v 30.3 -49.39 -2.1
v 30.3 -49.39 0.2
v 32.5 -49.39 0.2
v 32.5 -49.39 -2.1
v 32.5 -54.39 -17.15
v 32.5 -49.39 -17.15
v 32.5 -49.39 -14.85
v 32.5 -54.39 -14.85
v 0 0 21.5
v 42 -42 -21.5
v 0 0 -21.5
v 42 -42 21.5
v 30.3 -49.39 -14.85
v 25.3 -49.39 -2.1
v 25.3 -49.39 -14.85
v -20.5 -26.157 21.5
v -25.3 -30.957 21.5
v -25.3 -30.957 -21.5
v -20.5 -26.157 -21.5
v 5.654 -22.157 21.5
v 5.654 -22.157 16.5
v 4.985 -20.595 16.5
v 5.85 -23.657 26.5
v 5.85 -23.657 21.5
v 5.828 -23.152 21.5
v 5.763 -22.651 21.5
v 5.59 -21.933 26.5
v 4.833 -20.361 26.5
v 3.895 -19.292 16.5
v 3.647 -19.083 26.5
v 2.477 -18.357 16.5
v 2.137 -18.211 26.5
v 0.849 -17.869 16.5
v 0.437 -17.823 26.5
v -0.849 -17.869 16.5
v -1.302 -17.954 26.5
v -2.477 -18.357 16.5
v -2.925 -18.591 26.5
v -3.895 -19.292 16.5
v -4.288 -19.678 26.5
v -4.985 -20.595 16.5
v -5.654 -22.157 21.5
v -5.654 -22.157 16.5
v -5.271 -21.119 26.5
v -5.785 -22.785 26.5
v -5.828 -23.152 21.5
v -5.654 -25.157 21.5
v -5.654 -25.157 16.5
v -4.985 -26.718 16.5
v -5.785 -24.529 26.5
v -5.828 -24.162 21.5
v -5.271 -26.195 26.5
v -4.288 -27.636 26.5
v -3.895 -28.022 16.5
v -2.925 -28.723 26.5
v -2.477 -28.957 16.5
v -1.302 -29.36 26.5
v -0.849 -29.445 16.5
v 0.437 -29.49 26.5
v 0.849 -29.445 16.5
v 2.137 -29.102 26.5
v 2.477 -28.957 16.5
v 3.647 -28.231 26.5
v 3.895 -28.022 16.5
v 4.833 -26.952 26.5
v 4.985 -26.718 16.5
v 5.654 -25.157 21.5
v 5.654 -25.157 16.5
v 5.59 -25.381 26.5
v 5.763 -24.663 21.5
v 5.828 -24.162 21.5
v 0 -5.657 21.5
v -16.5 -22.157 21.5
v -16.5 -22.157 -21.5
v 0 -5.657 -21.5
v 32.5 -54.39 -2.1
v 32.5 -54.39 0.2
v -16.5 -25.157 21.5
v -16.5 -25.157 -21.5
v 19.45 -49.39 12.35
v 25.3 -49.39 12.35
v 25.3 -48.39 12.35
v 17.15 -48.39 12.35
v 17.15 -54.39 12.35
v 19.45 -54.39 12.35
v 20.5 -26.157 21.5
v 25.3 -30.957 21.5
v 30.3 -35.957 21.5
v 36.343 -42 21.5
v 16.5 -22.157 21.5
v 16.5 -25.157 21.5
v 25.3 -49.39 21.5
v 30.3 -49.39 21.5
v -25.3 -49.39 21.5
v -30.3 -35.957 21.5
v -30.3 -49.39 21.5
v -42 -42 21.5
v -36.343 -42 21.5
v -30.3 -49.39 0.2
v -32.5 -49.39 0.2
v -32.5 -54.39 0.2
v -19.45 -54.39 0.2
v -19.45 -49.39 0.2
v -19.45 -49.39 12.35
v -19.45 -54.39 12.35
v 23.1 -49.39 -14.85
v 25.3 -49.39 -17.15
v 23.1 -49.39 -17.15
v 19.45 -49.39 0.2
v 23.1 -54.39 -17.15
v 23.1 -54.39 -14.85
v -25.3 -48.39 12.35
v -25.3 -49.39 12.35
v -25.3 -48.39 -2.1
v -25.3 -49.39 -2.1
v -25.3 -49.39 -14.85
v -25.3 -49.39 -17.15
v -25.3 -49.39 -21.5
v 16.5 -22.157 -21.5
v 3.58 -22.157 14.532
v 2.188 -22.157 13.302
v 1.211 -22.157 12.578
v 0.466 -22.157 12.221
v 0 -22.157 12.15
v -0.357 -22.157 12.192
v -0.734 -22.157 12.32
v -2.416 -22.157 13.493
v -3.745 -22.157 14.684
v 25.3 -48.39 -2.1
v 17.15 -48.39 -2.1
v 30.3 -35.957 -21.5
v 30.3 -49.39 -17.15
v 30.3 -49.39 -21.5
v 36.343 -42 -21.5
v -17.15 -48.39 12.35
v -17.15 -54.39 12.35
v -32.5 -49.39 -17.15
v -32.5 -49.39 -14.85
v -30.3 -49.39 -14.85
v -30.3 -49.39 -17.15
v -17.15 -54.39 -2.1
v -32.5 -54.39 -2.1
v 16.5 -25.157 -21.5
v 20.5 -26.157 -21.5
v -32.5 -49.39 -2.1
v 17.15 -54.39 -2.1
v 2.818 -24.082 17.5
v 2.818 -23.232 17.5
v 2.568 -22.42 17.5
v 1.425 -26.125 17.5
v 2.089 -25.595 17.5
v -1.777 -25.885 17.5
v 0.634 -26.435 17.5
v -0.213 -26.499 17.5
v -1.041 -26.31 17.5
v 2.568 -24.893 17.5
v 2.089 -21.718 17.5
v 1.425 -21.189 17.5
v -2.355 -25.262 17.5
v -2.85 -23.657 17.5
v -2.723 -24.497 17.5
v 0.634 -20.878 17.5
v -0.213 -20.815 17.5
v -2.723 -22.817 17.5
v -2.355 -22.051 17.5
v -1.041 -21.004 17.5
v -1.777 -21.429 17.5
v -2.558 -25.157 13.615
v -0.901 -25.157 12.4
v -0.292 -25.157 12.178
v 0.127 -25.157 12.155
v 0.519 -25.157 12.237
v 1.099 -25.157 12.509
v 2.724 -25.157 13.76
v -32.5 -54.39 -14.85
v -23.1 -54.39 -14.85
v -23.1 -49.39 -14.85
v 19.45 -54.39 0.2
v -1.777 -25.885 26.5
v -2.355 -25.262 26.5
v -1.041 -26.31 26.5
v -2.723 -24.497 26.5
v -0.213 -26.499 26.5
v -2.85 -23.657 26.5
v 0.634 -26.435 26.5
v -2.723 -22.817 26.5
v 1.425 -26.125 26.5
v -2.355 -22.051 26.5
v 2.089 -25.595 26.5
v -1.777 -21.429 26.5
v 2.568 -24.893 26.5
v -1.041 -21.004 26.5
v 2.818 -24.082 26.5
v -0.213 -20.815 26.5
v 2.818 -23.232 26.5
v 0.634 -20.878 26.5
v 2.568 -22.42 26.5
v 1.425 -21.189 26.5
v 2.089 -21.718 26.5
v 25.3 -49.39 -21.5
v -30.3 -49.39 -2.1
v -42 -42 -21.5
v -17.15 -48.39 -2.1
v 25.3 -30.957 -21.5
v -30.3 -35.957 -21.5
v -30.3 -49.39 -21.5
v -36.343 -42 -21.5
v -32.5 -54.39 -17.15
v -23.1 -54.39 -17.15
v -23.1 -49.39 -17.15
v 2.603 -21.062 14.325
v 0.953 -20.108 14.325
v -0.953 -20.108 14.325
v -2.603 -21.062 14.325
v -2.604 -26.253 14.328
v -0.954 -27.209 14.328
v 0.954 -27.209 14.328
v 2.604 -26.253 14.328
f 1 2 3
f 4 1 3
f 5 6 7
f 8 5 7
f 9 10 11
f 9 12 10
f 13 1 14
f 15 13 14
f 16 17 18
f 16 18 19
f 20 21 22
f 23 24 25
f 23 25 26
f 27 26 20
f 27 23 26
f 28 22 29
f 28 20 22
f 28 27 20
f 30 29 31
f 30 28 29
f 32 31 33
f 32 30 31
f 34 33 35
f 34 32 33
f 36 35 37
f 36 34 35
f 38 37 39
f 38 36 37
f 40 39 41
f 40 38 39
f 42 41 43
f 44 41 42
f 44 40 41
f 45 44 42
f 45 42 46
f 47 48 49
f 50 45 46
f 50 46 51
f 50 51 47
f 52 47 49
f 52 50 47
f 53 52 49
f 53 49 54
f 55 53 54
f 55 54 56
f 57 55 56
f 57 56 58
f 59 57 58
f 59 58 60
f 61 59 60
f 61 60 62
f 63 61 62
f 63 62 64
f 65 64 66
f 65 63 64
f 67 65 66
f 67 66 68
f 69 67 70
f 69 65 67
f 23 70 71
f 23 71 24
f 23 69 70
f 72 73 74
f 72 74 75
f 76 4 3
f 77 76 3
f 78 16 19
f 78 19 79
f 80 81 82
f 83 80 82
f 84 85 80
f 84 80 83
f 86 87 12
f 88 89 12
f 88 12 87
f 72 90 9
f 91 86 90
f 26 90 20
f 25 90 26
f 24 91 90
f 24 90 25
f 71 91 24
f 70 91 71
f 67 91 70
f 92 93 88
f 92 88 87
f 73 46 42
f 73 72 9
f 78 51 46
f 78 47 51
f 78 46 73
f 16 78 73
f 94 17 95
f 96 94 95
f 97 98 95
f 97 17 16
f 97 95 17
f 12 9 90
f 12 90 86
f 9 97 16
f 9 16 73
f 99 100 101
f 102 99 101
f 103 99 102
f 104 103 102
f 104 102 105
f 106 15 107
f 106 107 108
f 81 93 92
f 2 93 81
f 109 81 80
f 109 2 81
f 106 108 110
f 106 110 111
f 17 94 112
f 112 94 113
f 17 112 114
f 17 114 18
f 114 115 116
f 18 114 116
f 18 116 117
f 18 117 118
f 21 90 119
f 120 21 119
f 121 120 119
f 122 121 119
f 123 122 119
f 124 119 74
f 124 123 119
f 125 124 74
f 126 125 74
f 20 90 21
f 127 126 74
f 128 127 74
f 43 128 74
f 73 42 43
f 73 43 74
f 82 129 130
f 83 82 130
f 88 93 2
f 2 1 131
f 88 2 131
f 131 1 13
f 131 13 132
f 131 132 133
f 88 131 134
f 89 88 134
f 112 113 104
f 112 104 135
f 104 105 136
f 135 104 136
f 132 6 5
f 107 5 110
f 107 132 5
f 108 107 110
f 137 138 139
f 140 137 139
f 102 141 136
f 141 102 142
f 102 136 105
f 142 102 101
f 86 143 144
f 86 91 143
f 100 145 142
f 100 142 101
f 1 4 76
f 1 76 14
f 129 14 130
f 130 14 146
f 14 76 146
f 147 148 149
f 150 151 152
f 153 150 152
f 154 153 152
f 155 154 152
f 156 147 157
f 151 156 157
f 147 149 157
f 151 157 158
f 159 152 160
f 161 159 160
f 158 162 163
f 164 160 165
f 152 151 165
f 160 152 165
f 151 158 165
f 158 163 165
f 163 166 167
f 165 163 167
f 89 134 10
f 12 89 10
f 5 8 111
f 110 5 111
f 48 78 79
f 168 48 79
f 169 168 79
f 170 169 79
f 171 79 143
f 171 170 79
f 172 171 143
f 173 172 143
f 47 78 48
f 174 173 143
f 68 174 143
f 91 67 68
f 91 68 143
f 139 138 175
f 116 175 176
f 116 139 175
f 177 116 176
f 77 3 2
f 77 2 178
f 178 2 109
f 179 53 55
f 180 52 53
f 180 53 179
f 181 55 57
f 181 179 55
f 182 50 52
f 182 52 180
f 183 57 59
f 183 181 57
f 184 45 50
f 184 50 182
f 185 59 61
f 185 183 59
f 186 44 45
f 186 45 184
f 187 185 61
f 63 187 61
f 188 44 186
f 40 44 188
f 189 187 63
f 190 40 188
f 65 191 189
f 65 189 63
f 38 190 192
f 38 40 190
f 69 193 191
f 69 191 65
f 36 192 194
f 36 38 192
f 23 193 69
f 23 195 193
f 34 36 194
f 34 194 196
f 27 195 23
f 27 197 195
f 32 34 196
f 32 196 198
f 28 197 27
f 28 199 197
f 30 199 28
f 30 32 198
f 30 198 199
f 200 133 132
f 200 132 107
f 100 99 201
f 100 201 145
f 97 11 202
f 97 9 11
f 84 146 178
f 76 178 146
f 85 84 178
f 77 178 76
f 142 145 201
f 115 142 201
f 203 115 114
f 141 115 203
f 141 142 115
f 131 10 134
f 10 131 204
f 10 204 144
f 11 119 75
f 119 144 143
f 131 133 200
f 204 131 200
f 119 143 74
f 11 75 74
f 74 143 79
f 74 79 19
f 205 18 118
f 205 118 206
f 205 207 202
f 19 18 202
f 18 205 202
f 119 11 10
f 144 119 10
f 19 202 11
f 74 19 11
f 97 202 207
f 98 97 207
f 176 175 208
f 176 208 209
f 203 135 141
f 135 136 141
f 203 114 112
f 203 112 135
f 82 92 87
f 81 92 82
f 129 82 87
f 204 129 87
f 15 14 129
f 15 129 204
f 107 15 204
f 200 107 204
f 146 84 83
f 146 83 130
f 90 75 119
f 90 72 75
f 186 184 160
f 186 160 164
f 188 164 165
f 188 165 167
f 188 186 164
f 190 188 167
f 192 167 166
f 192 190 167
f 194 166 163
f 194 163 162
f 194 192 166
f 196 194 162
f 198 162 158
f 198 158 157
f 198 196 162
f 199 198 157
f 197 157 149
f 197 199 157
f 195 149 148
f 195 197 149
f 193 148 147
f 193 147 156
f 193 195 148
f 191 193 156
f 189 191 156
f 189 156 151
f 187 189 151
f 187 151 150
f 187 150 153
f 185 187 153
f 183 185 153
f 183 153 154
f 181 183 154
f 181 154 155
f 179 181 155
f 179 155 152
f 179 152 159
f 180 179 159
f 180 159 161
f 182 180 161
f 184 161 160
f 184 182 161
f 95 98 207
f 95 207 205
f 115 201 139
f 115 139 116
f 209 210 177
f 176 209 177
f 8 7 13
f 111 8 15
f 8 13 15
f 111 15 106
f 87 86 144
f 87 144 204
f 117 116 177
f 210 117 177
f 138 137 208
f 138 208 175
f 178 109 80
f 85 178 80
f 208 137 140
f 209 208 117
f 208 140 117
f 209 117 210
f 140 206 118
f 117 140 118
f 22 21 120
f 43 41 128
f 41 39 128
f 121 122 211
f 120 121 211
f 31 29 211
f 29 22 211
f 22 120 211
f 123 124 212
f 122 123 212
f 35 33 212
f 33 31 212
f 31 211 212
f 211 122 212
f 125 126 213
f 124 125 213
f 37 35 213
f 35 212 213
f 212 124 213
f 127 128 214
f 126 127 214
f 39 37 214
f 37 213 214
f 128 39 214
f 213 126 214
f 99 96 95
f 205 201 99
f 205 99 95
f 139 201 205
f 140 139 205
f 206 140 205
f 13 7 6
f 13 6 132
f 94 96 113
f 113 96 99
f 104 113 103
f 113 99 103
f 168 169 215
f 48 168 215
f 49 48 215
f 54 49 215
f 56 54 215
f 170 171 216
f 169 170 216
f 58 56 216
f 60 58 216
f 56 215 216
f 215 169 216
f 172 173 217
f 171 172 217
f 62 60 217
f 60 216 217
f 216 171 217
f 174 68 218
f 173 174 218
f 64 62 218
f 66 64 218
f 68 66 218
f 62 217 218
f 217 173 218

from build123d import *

# Parameters (mm, degrees)
BOSS_EXTRUDE1_DEPTH  = 21.5
BOSS_EXTRUDE7_START  = 5
SKETCH11_R           = 5.85
BOSS_EXTRUDE7_DEPTH  = 10
SKETCH12_R           = 2.85
CUT_EXTRUDE3_DEPTH   = 9
BOSS_EXTRUDE8_START  = 0.1
SKETCH14_W           = 5
SKETCH14_H           = 43
BOSS_EXTRUDE8_DEPTH  = 18.432718
SKETCH17_W           = 9.4
SKETCH17_H           = 2.3
BOSS_EXTRUDE10_DEPTH = 5
SKETCH18_W           = 8.15
SKETCH18_H           = 14.45
BOSS_EXTRUDE11_DEPTH = 1


with BuildPart() as part:
    # Sketch1 → Boss-Extrude1 (new body, symmetric)
    with BuildSketch(Plane.XY):
        Polygon((0, 0), (-42, -42), (-36.343145751, -42), (-32.343145751, -38), (-20.5, -26.156854249), (-16.5, -25.156854249), (16.5, -25.156854249), (20.5, -26.156854249), (32.343145751, -38), (36.343145751, -42), (42, -42), align=None)
        Polygon((-16.5, -22.156854249), (0, -5.656854249), (16.5, -22.156854249), align=None, mode=Mode.SUBTRACT)
    extrude(amount=BOSS_EXTRUDE1_DEPTH, both=True)

    # Sketch11 → Boss-Extrude7 (add)
    with BuildSketch(Plane.XY.offset(21.5).offset(BOSS_EXTRUDE7_START)):
        with Locations((0, -23.656854249)):
            Circle(SKETCH11_R)
    extrude(amount=-BOSS_EXTRUDE7_DEPTH)

    # Sketch12 → Cut-Extrude3 (cut)
    with BuildSketch(Plane(origin=(0, 0, 26.5), x_dir=(-1, 0, 0), z_dir=(0, 0, -1))):
        with Locations((0, -23.656854249)):
            Circle(SKETCH12_R)
    extrude(amount=CUT_EXTRUDE3_DEPTH, mode=Mode.SUBTRACT)

    # Sketch14 → Boss-Extrude8 (add)
    with BuildSketch(Plane(origin=(0, -49.48957189, 0), x_dir=(1, 0, 0), z_dir=(0, 1, 0)).offset(BOSS_EXTRUDE8_START)):
        with Locations((-27.8, 0)):
            Rectangle(SKETCH14_W, SKETCH14_H)
    boss_extrude8 = extrude(amount=BOSS_EXTRUDE8_DEPTH)

    # Sketch17 → Boss-Extrude10 (add)
    with BuildSketch(Plane.XZ.offset(49.38957189)):
        Polygon((-17.15, 12.35), (-17.15, -2.1), (-32.5, -2.1), (-32.5, 0.2), (-19.45, 0.2), (-19.45, 12.35), align=None)
        with Locations((-27.8, -16)):
            Rectangle(SKETCH17_W, SKETCH17_H)
    boss_extrude10 = extrude(amount=BOSS_EXTRUDE10_DEPTH)

    # Sketch18 → Boss-Extrude11 (add)
    with BuildSketch(Plane(origin=(0, -49.38957189, 0), x_dir=(1, 0, 0), z_dir=(0, 1, 0))):
        with Locations((-21.225, -5.125)):
            Rectangle(SKETCH18_W, SKETCH18_H)
    boss_extrude11 = extrude(amount=BOSS_EXTRUDE11_DEPTH)

    # Mirror2: Boss-Extrude8, Boss-Extrude10, Boss-Extrude11 across plane
    add(boss_extrude8.mirror(Plane(origin=(0, 0, 0), x_dir=(0, 0, 1), z_dir=(1, 0, 0))))
    add(boss_extrude10.mirror(Plane(origin=(0, 0, 0), x_dir=(0, 0, 1), z_dir=(1, 0, 0))))
    add(boss_extrude11.mirror(Plane(origin=(0, 0, 0), x_dir=(0, 0, 1), z_dir=(1, 0, 0))))

    # Sketch15 → Revolve1 (revolve)
    with BuildSketch(Plane(origin=(0, 0, 0), x_dir=(0, 0, -1), z_dir=(1, 0, 0))):
        Polygon((-16.5, -17.806854249), (-10.65, -23.656854249), (-16.5, -23.656854249), align=None)
    revolve(axis=Axis((0, -23.656854249, 10.65), (0, 0, 1)))


solid = part.part
